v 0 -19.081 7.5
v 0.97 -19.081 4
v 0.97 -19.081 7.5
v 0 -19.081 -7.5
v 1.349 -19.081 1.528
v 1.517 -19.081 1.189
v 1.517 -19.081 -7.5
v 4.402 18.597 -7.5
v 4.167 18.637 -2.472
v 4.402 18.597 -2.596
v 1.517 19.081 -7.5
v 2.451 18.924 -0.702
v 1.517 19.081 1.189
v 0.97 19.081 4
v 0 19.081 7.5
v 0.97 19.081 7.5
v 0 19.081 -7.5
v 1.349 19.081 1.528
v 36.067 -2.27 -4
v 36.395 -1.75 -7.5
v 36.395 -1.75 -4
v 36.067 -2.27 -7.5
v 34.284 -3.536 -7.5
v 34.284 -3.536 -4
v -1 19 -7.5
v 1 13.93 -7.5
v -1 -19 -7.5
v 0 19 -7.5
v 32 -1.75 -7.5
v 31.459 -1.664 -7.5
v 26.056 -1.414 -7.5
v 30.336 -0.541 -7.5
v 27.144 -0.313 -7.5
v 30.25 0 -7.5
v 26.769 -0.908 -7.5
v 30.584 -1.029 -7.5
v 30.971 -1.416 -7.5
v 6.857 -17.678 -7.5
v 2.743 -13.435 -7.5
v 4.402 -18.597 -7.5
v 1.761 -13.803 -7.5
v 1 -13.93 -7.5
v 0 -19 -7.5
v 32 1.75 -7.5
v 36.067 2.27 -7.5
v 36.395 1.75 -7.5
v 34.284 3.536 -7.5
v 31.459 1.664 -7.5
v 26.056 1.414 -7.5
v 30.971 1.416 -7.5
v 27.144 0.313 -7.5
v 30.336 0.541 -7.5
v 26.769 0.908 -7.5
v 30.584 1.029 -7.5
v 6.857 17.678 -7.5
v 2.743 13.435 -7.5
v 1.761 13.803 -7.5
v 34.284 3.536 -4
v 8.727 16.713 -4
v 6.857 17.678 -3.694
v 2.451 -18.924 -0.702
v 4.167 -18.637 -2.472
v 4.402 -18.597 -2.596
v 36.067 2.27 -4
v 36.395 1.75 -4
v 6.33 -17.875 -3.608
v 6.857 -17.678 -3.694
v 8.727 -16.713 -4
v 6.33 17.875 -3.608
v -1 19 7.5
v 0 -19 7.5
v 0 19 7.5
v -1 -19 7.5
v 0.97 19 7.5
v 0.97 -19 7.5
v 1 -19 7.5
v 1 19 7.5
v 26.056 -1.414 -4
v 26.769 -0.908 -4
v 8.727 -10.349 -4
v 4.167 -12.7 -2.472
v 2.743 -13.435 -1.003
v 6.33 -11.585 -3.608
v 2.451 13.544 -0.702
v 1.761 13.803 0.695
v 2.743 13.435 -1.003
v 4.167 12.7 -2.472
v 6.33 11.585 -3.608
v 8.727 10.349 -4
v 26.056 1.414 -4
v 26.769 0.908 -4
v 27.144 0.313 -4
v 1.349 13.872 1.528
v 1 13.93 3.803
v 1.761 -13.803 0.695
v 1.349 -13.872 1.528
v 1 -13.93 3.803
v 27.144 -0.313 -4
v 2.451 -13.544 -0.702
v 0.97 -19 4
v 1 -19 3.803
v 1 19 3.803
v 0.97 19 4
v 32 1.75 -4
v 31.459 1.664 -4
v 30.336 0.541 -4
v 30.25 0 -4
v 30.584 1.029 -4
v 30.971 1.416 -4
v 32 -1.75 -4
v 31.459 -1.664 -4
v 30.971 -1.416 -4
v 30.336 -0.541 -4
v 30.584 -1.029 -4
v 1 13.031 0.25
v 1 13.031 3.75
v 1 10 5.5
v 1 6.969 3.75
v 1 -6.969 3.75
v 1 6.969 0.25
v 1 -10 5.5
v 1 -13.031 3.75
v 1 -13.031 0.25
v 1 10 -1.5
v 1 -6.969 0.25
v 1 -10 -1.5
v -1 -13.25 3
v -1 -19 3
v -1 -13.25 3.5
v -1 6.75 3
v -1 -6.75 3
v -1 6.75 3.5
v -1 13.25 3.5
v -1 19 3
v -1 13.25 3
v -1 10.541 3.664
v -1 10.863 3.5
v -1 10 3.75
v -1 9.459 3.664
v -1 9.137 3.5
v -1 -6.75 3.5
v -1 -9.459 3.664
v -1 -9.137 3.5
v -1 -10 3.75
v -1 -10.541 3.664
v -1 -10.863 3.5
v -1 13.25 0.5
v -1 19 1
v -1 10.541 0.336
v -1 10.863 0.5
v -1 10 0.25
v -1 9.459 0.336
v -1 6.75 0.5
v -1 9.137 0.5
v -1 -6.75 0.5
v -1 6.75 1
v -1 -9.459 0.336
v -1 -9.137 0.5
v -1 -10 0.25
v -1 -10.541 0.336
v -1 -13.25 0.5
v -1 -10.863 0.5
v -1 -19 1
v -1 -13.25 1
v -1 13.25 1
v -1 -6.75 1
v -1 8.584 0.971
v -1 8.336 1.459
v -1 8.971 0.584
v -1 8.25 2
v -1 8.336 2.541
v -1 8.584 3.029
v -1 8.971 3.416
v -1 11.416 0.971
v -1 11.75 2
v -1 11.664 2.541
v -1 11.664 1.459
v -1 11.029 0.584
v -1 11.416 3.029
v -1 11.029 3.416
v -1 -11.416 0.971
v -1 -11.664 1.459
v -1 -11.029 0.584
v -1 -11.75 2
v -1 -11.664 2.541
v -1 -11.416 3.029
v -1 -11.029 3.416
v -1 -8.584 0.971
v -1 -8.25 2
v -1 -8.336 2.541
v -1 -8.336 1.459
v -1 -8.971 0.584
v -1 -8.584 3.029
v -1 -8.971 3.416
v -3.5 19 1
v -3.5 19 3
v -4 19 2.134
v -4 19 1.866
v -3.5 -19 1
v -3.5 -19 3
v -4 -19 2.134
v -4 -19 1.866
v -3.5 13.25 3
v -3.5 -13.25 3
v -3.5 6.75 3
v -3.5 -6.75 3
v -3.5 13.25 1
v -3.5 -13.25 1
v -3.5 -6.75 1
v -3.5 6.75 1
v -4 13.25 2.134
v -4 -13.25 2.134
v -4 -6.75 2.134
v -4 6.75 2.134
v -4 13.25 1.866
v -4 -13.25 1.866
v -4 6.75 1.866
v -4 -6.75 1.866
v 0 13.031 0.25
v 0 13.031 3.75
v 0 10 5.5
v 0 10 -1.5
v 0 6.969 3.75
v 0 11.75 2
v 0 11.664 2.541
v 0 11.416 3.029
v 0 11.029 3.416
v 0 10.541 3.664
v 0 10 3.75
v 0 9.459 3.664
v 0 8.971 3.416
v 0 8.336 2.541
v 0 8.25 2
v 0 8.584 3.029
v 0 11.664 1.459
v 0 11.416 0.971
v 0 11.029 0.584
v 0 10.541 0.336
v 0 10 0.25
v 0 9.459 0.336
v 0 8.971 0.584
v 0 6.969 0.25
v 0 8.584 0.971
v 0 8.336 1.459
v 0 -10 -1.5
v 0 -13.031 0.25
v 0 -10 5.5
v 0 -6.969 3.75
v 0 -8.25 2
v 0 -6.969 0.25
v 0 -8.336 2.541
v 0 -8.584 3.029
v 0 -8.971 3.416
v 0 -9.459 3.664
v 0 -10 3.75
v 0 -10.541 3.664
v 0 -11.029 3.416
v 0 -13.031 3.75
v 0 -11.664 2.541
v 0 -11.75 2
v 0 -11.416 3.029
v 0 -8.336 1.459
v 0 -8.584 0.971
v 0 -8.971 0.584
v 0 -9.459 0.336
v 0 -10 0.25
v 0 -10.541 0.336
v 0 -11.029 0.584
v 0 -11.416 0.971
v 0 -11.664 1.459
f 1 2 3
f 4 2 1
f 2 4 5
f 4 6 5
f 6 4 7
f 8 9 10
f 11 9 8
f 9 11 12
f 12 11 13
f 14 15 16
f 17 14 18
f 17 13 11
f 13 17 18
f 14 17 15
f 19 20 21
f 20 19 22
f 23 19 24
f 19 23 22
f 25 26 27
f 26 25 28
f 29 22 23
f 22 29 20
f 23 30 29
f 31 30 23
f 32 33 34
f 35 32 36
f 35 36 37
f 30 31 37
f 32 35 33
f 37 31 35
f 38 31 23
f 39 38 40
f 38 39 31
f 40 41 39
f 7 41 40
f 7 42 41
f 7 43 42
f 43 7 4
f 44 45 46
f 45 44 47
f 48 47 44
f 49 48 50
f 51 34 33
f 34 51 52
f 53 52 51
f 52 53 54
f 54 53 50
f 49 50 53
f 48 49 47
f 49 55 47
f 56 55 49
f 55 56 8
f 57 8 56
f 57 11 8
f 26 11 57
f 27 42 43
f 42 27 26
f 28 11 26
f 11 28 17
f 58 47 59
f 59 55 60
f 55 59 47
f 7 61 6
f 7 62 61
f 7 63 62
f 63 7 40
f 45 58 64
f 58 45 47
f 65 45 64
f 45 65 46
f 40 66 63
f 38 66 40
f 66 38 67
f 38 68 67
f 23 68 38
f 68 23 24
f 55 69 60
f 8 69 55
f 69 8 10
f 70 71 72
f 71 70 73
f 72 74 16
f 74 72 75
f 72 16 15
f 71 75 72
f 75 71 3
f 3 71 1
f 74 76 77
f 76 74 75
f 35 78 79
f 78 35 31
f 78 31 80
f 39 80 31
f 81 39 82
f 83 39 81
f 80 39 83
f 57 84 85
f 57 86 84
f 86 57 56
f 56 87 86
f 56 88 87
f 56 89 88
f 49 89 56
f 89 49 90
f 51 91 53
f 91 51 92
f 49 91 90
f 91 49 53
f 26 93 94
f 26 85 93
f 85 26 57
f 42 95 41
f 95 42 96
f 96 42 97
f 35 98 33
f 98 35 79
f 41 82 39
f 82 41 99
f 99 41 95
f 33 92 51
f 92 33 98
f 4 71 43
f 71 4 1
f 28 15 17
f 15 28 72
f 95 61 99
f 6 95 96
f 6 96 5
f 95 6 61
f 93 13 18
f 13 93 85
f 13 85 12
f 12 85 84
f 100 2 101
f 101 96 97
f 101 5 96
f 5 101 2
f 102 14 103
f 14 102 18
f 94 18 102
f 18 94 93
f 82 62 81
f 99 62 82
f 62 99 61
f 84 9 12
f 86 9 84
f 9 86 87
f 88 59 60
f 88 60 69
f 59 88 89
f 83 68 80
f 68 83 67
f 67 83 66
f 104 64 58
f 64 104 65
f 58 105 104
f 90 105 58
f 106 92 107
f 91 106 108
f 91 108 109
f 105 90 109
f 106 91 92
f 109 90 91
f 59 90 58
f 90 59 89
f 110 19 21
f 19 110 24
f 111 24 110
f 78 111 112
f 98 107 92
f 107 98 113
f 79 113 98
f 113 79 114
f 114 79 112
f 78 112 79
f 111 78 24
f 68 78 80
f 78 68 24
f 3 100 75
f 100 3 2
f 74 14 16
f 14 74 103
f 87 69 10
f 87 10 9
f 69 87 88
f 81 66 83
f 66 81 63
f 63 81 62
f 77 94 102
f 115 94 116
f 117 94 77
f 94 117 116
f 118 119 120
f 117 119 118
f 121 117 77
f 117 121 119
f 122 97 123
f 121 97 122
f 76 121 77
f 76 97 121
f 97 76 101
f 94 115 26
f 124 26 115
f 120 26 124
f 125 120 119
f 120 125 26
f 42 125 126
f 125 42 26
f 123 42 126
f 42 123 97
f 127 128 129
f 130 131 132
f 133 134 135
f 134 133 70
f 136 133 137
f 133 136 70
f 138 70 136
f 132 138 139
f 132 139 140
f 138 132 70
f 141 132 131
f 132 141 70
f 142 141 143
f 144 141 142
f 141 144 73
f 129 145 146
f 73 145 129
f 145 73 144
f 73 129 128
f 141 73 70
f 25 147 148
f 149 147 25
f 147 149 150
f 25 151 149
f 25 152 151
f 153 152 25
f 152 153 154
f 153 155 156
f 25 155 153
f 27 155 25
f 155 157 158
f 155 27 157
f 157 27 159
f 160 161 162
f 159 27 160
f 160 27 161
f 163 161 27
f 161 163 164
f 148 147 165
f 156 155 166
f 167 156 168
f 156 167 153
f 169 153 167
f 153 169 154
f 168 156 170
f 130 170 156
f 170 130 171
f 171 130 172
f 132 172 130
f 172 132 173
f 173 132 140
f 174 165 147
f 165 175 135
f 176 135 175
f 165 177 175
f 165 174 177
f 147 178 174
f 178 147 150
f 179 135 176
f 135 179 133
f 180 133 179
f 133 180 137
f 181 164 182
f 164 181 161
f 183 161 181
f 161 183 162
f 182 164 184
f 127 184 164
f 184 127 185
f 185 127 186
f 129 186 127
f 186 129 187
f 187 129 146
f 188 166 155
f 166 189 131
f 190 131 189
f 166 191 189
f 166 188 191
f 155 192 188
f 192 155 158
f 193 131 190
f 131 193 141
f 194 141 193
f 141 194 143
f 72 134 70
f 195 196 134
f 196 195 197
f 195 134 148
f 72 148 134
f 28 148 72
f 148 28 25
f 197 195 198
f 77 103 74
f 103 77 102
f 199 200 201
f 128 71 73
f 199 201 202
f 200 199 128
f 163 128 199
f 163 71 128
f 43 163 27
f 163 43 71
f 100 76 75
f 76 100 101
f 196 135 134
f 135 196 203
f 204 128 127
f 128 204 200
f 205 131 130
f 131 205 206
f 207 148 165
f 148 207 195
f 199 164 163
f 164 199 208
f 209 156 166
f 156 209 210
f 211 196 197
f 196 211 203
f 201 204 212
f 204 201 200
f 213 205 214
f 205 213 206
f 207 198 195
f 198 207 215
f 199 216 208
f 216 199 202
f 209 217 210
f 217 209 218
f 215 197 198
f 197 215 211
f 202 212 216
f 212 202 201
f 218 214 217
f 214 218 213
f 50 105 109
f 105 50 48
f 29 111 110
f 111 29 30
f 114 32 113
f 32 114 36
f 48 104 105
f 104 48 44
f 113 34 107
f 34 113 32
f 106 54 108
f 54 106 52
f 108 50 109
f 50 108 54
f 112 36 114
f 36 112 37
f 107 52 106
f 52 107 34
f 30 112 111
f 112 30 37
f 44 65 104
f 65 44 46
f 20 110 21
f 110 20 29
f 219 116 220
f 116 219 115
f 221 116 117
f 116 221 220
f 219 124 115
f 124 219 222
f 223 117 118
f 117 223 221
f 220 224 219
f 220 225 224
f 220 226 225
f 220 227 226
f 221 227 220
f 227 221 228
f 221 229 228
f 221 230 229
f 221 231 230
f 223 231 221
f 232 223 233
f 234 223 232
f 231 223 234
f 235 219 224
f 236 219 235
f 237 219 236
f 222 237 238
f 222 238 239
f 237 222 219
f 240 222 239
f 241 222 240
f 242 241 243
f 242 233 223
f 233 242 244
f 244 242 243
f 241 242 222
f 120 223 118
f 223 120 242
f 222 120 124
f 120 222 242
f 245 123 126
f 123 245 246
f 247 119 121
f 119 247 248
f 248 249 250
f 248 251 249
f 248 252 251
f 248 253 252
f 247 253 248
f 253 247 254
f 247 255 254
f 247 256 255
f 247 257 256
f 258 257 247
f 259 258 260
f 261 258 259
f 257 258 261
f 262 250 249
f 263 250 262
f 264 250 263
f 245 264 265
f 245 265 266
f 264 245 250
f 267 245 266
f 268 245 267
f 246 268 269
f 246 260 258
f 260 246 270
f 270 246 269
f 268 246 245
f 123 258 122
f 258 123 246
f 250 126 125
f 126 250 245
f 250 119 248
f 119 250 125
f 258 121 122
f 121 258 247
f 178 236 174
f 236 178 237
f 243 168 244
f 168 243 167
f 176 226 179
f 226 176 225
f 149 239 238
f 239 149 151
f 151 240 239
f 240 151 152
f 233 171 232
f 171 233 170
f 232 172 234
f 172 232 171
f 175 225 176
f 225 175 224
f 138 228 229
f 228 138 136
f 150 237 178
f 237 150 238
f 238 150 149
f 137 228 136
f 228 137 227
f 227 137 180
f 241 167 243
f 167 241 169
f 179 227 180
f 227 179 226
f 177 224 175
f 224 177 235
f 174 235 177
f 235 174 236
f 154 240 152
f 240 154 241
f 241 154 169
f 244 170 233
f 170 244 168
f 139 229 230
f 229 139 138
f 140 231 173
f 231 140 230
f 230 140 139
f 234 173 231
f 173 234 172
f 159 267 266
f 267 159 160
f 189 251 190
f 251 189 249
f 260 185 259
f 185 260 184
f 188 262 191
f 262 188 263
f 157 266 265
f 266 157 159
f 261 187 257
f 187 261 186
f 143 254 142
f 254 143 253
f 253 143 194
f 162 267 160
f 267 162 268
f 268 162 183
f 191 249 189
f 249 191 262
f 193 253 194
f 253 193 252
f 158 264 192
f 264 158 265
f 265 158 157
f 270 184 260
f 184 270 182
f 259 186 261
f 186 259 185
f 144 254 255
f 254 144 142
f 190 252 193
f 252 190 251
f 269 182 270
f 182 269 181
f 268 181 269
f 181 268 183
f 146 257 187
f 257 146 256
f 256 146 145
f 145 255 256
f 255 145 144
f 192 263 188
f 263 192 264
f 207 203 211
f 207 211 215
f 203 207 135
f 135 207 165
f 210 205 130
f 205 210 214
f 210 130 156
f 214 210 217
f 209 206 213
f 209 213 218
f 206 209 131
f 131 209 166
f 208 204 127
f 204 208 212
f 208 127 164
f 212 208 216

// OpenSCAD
include <fillets_and_rounds.scad>

module screen_bracket(hole_dist = 34,nut_h = 2,denom=33,r=8,inner=1,outer=1){

difference(){
    scale([1,0.5,1])union(){
scale([hole_dist/denom,1,1])difference(){
    scale([outer,1,1]){rotate([0,0,45]){add_rounds(axis="z",R=10,fn=20)cube([60,60,15],center=true);}}
    
    scale([inner,1,1]){rotate([0,0,45]){
        add_rounds(axis="z",R=4,fn=20)
        cube([42,42,15],center=true);
        }}
    
    translate([-50,0,0])cube(100,center=true);
    translate([51,0,46]){add_rounds(R=r,fn=20,axis="y")cube(100,center=true);}
    
}//end difference
cube([2,76,15],center=true);
translate([-2,0,nut_h]){add_rounds(R=1,fn=6,axis="y")cube([4,76,2],center=true);}
}//end union
translate([hole_dist,0,0]){cylinder(h=15,d=3.5,$fn=20,center=true);
    translate([10,0,-5])
    cube([20,3.5,10],center=true);}

offst = 10;
translate([0,offst,nut_h]){rotate([0,90,0])cylinder(d=7,h=10,$fn=6);}
translate([0,-offst,nut_h]){rotate([0,90,0])cylinder(d=7,h=10,$fn=6);}
translate([-5,offst,nut_h]){rotate([0,90,0])cylinder(d=3.5,h=10,$fn=20);}
translate([-5,-offst,nut_h]){rotate([0,90,0])cylinder(d=3.5,h=10,$fn=20);}

translate([-2.5,offst,nut_h])cube([3,6.5,3],center=true);
translate([-2.5,-offst,nut_h])cube([3,6.5,3],center=true);

}
}//end screen bracket

//8mm bracket
//screen_bracket(hole_dist=13,inner=0.8,outer=1.2,r=15);

//13mm bracket
//translate([0,-100,0])
//screen_bracket(hole_dist=13,inner=0.8,outer=1.2,r=15);


//34mm
//translate([0,50,0])
//screen_bracket();

//32mm
//translate([0,-50,0])
screen_bracket(hole_dist=32);

//17mm
//translate([0,100,0])
//screen_bracket(hole_dist=17,inner=0.9,outer=1.1,r=15);
